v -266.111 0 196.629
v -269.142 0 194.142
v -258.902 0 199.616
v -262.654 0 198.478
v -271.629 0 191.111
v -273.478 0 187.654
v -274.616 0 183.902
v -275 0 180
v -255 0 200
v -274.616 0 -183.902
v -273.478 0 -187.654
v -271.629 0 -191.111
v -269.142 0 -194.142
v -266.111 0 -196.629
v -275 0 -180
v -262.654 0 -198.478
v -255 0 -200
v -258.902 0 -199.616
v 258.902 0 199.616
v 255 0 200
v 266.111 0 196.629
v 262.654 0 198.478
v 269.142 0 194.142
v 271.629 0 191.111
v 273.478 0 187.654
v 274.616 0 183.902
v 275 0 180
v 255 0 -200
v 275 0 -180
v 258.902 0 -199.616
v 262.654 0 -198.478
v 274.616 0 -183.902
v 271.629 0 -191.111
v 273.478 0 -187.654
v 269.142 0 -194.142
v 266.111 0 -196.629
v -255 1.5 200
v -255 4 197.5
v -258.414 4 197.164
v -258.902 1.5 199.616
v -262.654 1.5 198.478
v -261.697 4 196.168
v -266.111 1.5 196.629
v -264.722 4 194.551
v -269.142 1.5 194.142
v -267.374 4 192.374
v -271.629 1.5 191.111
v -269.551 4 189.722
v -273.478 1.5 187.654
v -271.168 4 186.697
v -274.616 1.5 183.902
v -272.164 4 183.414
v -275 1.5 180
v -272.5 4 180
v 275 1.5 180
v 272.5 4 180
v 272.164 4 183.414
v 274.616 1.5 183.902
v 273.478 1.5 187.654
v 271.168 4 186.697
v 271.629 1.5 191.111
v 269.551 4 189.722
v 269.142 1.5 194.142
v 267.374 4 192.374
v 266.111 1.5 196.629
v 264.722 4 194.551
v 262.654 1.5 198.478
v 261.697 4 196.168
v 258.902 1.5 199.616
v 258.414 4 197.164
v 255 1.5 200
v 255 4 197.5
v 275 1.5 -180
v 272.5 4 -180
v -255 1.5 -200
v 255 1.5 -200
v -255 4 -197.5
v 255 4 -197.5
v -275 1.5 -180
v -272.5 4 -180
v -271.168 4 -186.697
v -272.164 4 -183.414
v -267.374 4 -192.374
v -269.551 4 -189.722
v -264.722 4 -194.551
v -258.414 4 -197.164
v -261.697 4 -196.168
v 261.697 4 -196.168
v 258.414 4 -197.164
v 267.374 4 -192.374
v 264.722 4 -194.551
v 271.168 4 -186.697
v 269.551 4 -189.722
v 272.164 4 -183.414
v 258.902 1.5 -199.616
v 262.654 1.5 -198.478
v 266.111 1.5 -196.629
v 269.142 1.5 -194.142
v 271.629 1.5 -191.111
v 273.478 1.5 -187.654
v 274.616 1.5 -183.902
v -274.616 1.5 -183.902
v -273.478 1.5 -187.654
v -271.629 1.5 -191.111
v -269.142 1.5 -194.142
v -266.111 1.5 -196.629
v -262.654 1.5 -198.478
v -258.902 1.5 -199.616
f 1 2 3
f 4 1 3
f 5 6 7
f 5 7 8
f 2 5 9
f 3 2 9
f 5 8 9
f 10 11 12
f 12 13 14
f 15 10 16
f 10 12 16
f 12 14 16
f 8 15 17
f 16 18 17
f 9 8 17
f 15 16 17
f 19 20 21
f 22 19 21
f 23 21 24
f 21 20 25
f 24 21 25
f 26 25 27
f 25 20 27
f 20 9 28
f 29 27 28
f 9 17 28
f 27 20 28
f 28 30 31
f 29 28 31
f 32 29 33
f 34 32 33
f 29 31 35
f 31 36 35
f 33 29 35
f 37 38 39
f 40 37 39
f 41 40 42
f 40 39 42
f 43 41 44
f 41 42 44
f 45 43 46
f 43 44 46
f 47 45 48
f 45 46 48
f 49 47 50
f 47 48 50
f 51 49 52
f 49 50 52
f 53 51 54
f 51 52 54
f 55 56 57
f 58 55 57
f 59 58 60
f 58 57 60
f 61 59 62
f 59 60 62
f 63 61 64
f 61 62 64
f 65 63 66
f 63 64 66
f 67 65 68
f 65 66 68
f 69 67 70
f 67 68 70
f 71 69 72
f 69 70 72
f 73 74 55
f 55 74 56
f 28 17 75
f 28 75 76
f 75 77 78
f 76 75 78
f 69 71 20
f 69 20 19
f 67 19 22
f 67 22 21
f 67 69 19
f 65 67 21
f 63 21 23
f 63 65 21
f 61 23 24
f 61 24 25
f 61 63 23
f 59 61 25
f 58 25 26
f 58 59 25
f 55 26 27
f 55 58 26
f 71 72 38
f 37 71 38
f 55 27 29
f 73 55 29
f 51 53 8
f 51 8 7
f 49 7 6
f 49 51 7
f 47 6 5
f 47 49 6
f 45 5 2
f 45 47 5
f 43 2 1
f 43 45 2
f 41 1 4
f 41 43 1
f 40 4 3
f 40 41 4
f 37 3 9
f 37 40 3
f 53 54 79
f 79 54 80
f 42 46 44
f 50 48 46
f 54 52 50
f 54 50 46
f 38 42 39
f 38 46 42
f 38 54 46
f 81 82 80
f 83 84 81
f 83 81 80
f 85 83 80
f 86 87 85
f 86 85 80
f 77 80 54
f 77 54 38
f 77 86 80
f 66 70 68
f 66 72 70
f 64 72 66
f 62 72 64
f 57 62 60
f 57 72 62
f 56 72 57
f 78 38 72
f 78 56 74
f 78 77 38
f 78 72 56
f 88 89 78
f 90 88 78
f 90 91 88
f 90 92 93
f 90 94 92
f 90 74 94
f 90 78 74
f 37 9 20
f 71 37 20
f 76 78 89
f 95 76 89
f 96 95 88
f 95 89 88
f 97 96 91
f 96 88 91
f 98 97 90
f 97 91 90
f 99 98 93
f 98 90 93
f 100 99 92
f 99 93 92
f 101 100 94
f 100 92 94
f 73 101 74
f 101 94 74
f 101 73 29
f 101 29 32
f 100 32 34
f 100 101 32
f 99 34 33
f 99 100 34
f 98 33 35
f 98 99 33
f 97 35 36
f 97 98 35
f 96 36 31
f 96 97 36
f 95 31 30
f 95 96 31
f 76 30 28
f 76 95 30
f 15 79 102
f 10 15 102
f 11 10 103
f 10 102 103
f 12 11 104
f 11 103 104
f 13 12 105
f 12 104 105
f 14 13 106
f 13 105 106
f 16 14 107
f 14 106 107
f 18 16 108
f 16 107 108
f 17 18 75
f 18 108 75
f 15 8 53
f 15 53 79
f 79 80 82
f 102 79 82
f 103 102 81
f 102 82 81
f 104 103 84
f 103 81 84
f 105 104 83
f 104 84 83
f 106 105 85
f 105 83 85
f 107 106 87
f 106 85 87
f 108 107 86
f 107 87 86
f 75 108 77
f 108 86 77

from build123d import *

# Parameters (mm, degrees)
SKETCH_1_W      = 550
SKETCH_1_H      = 400
EXTRUDE_1_DEPTH = 4
FILLET_1_R      = 20
CHAMFER_1_SIZE  = 2.5


with BuildPart() as part:
    # 스케치1 → 보스-돌출1 (new body)
    with BuildSketch(Plane(origin=(0, 0, 0), x_dir=(1, 0, 0), z_dir=(0, 1, 0))):
        Rectangle(SKETCH_1_W, SKETCH_1_H)
    extrude(amount=EXTRUDE_1_DEPTH)

    # 필렛1
    fillet_1_edges = [part.edges().sort_by_distance(p)[0] for p in [
        (275, 2, 200),
        (-275, 2, 200),
        (-275, 2, -200),
        (275, 2, -200),
    ]]
    fillet(fillet_1_edges, radius=FILLET_1_R)

    # 모따기1
    chamfer_1_edges = [part.edges().sort_by_distance(p)[0] for p in [
        (-275, 4, 0),
        (0, 4, -200),
        (275, 4, 0),
        (0, 4, 200),
        (269.142135624, 4, 194.142135624),
        (269.142135624, 4, -194.142135624),
        (-269.142135624, 4, 194.142135624),
        (-269.142135624, 4, -194.142135624),
    ]]
    chamfer(chamfer_1_edges, length=CHAMFER_1_SIZE)


solid = part.part
